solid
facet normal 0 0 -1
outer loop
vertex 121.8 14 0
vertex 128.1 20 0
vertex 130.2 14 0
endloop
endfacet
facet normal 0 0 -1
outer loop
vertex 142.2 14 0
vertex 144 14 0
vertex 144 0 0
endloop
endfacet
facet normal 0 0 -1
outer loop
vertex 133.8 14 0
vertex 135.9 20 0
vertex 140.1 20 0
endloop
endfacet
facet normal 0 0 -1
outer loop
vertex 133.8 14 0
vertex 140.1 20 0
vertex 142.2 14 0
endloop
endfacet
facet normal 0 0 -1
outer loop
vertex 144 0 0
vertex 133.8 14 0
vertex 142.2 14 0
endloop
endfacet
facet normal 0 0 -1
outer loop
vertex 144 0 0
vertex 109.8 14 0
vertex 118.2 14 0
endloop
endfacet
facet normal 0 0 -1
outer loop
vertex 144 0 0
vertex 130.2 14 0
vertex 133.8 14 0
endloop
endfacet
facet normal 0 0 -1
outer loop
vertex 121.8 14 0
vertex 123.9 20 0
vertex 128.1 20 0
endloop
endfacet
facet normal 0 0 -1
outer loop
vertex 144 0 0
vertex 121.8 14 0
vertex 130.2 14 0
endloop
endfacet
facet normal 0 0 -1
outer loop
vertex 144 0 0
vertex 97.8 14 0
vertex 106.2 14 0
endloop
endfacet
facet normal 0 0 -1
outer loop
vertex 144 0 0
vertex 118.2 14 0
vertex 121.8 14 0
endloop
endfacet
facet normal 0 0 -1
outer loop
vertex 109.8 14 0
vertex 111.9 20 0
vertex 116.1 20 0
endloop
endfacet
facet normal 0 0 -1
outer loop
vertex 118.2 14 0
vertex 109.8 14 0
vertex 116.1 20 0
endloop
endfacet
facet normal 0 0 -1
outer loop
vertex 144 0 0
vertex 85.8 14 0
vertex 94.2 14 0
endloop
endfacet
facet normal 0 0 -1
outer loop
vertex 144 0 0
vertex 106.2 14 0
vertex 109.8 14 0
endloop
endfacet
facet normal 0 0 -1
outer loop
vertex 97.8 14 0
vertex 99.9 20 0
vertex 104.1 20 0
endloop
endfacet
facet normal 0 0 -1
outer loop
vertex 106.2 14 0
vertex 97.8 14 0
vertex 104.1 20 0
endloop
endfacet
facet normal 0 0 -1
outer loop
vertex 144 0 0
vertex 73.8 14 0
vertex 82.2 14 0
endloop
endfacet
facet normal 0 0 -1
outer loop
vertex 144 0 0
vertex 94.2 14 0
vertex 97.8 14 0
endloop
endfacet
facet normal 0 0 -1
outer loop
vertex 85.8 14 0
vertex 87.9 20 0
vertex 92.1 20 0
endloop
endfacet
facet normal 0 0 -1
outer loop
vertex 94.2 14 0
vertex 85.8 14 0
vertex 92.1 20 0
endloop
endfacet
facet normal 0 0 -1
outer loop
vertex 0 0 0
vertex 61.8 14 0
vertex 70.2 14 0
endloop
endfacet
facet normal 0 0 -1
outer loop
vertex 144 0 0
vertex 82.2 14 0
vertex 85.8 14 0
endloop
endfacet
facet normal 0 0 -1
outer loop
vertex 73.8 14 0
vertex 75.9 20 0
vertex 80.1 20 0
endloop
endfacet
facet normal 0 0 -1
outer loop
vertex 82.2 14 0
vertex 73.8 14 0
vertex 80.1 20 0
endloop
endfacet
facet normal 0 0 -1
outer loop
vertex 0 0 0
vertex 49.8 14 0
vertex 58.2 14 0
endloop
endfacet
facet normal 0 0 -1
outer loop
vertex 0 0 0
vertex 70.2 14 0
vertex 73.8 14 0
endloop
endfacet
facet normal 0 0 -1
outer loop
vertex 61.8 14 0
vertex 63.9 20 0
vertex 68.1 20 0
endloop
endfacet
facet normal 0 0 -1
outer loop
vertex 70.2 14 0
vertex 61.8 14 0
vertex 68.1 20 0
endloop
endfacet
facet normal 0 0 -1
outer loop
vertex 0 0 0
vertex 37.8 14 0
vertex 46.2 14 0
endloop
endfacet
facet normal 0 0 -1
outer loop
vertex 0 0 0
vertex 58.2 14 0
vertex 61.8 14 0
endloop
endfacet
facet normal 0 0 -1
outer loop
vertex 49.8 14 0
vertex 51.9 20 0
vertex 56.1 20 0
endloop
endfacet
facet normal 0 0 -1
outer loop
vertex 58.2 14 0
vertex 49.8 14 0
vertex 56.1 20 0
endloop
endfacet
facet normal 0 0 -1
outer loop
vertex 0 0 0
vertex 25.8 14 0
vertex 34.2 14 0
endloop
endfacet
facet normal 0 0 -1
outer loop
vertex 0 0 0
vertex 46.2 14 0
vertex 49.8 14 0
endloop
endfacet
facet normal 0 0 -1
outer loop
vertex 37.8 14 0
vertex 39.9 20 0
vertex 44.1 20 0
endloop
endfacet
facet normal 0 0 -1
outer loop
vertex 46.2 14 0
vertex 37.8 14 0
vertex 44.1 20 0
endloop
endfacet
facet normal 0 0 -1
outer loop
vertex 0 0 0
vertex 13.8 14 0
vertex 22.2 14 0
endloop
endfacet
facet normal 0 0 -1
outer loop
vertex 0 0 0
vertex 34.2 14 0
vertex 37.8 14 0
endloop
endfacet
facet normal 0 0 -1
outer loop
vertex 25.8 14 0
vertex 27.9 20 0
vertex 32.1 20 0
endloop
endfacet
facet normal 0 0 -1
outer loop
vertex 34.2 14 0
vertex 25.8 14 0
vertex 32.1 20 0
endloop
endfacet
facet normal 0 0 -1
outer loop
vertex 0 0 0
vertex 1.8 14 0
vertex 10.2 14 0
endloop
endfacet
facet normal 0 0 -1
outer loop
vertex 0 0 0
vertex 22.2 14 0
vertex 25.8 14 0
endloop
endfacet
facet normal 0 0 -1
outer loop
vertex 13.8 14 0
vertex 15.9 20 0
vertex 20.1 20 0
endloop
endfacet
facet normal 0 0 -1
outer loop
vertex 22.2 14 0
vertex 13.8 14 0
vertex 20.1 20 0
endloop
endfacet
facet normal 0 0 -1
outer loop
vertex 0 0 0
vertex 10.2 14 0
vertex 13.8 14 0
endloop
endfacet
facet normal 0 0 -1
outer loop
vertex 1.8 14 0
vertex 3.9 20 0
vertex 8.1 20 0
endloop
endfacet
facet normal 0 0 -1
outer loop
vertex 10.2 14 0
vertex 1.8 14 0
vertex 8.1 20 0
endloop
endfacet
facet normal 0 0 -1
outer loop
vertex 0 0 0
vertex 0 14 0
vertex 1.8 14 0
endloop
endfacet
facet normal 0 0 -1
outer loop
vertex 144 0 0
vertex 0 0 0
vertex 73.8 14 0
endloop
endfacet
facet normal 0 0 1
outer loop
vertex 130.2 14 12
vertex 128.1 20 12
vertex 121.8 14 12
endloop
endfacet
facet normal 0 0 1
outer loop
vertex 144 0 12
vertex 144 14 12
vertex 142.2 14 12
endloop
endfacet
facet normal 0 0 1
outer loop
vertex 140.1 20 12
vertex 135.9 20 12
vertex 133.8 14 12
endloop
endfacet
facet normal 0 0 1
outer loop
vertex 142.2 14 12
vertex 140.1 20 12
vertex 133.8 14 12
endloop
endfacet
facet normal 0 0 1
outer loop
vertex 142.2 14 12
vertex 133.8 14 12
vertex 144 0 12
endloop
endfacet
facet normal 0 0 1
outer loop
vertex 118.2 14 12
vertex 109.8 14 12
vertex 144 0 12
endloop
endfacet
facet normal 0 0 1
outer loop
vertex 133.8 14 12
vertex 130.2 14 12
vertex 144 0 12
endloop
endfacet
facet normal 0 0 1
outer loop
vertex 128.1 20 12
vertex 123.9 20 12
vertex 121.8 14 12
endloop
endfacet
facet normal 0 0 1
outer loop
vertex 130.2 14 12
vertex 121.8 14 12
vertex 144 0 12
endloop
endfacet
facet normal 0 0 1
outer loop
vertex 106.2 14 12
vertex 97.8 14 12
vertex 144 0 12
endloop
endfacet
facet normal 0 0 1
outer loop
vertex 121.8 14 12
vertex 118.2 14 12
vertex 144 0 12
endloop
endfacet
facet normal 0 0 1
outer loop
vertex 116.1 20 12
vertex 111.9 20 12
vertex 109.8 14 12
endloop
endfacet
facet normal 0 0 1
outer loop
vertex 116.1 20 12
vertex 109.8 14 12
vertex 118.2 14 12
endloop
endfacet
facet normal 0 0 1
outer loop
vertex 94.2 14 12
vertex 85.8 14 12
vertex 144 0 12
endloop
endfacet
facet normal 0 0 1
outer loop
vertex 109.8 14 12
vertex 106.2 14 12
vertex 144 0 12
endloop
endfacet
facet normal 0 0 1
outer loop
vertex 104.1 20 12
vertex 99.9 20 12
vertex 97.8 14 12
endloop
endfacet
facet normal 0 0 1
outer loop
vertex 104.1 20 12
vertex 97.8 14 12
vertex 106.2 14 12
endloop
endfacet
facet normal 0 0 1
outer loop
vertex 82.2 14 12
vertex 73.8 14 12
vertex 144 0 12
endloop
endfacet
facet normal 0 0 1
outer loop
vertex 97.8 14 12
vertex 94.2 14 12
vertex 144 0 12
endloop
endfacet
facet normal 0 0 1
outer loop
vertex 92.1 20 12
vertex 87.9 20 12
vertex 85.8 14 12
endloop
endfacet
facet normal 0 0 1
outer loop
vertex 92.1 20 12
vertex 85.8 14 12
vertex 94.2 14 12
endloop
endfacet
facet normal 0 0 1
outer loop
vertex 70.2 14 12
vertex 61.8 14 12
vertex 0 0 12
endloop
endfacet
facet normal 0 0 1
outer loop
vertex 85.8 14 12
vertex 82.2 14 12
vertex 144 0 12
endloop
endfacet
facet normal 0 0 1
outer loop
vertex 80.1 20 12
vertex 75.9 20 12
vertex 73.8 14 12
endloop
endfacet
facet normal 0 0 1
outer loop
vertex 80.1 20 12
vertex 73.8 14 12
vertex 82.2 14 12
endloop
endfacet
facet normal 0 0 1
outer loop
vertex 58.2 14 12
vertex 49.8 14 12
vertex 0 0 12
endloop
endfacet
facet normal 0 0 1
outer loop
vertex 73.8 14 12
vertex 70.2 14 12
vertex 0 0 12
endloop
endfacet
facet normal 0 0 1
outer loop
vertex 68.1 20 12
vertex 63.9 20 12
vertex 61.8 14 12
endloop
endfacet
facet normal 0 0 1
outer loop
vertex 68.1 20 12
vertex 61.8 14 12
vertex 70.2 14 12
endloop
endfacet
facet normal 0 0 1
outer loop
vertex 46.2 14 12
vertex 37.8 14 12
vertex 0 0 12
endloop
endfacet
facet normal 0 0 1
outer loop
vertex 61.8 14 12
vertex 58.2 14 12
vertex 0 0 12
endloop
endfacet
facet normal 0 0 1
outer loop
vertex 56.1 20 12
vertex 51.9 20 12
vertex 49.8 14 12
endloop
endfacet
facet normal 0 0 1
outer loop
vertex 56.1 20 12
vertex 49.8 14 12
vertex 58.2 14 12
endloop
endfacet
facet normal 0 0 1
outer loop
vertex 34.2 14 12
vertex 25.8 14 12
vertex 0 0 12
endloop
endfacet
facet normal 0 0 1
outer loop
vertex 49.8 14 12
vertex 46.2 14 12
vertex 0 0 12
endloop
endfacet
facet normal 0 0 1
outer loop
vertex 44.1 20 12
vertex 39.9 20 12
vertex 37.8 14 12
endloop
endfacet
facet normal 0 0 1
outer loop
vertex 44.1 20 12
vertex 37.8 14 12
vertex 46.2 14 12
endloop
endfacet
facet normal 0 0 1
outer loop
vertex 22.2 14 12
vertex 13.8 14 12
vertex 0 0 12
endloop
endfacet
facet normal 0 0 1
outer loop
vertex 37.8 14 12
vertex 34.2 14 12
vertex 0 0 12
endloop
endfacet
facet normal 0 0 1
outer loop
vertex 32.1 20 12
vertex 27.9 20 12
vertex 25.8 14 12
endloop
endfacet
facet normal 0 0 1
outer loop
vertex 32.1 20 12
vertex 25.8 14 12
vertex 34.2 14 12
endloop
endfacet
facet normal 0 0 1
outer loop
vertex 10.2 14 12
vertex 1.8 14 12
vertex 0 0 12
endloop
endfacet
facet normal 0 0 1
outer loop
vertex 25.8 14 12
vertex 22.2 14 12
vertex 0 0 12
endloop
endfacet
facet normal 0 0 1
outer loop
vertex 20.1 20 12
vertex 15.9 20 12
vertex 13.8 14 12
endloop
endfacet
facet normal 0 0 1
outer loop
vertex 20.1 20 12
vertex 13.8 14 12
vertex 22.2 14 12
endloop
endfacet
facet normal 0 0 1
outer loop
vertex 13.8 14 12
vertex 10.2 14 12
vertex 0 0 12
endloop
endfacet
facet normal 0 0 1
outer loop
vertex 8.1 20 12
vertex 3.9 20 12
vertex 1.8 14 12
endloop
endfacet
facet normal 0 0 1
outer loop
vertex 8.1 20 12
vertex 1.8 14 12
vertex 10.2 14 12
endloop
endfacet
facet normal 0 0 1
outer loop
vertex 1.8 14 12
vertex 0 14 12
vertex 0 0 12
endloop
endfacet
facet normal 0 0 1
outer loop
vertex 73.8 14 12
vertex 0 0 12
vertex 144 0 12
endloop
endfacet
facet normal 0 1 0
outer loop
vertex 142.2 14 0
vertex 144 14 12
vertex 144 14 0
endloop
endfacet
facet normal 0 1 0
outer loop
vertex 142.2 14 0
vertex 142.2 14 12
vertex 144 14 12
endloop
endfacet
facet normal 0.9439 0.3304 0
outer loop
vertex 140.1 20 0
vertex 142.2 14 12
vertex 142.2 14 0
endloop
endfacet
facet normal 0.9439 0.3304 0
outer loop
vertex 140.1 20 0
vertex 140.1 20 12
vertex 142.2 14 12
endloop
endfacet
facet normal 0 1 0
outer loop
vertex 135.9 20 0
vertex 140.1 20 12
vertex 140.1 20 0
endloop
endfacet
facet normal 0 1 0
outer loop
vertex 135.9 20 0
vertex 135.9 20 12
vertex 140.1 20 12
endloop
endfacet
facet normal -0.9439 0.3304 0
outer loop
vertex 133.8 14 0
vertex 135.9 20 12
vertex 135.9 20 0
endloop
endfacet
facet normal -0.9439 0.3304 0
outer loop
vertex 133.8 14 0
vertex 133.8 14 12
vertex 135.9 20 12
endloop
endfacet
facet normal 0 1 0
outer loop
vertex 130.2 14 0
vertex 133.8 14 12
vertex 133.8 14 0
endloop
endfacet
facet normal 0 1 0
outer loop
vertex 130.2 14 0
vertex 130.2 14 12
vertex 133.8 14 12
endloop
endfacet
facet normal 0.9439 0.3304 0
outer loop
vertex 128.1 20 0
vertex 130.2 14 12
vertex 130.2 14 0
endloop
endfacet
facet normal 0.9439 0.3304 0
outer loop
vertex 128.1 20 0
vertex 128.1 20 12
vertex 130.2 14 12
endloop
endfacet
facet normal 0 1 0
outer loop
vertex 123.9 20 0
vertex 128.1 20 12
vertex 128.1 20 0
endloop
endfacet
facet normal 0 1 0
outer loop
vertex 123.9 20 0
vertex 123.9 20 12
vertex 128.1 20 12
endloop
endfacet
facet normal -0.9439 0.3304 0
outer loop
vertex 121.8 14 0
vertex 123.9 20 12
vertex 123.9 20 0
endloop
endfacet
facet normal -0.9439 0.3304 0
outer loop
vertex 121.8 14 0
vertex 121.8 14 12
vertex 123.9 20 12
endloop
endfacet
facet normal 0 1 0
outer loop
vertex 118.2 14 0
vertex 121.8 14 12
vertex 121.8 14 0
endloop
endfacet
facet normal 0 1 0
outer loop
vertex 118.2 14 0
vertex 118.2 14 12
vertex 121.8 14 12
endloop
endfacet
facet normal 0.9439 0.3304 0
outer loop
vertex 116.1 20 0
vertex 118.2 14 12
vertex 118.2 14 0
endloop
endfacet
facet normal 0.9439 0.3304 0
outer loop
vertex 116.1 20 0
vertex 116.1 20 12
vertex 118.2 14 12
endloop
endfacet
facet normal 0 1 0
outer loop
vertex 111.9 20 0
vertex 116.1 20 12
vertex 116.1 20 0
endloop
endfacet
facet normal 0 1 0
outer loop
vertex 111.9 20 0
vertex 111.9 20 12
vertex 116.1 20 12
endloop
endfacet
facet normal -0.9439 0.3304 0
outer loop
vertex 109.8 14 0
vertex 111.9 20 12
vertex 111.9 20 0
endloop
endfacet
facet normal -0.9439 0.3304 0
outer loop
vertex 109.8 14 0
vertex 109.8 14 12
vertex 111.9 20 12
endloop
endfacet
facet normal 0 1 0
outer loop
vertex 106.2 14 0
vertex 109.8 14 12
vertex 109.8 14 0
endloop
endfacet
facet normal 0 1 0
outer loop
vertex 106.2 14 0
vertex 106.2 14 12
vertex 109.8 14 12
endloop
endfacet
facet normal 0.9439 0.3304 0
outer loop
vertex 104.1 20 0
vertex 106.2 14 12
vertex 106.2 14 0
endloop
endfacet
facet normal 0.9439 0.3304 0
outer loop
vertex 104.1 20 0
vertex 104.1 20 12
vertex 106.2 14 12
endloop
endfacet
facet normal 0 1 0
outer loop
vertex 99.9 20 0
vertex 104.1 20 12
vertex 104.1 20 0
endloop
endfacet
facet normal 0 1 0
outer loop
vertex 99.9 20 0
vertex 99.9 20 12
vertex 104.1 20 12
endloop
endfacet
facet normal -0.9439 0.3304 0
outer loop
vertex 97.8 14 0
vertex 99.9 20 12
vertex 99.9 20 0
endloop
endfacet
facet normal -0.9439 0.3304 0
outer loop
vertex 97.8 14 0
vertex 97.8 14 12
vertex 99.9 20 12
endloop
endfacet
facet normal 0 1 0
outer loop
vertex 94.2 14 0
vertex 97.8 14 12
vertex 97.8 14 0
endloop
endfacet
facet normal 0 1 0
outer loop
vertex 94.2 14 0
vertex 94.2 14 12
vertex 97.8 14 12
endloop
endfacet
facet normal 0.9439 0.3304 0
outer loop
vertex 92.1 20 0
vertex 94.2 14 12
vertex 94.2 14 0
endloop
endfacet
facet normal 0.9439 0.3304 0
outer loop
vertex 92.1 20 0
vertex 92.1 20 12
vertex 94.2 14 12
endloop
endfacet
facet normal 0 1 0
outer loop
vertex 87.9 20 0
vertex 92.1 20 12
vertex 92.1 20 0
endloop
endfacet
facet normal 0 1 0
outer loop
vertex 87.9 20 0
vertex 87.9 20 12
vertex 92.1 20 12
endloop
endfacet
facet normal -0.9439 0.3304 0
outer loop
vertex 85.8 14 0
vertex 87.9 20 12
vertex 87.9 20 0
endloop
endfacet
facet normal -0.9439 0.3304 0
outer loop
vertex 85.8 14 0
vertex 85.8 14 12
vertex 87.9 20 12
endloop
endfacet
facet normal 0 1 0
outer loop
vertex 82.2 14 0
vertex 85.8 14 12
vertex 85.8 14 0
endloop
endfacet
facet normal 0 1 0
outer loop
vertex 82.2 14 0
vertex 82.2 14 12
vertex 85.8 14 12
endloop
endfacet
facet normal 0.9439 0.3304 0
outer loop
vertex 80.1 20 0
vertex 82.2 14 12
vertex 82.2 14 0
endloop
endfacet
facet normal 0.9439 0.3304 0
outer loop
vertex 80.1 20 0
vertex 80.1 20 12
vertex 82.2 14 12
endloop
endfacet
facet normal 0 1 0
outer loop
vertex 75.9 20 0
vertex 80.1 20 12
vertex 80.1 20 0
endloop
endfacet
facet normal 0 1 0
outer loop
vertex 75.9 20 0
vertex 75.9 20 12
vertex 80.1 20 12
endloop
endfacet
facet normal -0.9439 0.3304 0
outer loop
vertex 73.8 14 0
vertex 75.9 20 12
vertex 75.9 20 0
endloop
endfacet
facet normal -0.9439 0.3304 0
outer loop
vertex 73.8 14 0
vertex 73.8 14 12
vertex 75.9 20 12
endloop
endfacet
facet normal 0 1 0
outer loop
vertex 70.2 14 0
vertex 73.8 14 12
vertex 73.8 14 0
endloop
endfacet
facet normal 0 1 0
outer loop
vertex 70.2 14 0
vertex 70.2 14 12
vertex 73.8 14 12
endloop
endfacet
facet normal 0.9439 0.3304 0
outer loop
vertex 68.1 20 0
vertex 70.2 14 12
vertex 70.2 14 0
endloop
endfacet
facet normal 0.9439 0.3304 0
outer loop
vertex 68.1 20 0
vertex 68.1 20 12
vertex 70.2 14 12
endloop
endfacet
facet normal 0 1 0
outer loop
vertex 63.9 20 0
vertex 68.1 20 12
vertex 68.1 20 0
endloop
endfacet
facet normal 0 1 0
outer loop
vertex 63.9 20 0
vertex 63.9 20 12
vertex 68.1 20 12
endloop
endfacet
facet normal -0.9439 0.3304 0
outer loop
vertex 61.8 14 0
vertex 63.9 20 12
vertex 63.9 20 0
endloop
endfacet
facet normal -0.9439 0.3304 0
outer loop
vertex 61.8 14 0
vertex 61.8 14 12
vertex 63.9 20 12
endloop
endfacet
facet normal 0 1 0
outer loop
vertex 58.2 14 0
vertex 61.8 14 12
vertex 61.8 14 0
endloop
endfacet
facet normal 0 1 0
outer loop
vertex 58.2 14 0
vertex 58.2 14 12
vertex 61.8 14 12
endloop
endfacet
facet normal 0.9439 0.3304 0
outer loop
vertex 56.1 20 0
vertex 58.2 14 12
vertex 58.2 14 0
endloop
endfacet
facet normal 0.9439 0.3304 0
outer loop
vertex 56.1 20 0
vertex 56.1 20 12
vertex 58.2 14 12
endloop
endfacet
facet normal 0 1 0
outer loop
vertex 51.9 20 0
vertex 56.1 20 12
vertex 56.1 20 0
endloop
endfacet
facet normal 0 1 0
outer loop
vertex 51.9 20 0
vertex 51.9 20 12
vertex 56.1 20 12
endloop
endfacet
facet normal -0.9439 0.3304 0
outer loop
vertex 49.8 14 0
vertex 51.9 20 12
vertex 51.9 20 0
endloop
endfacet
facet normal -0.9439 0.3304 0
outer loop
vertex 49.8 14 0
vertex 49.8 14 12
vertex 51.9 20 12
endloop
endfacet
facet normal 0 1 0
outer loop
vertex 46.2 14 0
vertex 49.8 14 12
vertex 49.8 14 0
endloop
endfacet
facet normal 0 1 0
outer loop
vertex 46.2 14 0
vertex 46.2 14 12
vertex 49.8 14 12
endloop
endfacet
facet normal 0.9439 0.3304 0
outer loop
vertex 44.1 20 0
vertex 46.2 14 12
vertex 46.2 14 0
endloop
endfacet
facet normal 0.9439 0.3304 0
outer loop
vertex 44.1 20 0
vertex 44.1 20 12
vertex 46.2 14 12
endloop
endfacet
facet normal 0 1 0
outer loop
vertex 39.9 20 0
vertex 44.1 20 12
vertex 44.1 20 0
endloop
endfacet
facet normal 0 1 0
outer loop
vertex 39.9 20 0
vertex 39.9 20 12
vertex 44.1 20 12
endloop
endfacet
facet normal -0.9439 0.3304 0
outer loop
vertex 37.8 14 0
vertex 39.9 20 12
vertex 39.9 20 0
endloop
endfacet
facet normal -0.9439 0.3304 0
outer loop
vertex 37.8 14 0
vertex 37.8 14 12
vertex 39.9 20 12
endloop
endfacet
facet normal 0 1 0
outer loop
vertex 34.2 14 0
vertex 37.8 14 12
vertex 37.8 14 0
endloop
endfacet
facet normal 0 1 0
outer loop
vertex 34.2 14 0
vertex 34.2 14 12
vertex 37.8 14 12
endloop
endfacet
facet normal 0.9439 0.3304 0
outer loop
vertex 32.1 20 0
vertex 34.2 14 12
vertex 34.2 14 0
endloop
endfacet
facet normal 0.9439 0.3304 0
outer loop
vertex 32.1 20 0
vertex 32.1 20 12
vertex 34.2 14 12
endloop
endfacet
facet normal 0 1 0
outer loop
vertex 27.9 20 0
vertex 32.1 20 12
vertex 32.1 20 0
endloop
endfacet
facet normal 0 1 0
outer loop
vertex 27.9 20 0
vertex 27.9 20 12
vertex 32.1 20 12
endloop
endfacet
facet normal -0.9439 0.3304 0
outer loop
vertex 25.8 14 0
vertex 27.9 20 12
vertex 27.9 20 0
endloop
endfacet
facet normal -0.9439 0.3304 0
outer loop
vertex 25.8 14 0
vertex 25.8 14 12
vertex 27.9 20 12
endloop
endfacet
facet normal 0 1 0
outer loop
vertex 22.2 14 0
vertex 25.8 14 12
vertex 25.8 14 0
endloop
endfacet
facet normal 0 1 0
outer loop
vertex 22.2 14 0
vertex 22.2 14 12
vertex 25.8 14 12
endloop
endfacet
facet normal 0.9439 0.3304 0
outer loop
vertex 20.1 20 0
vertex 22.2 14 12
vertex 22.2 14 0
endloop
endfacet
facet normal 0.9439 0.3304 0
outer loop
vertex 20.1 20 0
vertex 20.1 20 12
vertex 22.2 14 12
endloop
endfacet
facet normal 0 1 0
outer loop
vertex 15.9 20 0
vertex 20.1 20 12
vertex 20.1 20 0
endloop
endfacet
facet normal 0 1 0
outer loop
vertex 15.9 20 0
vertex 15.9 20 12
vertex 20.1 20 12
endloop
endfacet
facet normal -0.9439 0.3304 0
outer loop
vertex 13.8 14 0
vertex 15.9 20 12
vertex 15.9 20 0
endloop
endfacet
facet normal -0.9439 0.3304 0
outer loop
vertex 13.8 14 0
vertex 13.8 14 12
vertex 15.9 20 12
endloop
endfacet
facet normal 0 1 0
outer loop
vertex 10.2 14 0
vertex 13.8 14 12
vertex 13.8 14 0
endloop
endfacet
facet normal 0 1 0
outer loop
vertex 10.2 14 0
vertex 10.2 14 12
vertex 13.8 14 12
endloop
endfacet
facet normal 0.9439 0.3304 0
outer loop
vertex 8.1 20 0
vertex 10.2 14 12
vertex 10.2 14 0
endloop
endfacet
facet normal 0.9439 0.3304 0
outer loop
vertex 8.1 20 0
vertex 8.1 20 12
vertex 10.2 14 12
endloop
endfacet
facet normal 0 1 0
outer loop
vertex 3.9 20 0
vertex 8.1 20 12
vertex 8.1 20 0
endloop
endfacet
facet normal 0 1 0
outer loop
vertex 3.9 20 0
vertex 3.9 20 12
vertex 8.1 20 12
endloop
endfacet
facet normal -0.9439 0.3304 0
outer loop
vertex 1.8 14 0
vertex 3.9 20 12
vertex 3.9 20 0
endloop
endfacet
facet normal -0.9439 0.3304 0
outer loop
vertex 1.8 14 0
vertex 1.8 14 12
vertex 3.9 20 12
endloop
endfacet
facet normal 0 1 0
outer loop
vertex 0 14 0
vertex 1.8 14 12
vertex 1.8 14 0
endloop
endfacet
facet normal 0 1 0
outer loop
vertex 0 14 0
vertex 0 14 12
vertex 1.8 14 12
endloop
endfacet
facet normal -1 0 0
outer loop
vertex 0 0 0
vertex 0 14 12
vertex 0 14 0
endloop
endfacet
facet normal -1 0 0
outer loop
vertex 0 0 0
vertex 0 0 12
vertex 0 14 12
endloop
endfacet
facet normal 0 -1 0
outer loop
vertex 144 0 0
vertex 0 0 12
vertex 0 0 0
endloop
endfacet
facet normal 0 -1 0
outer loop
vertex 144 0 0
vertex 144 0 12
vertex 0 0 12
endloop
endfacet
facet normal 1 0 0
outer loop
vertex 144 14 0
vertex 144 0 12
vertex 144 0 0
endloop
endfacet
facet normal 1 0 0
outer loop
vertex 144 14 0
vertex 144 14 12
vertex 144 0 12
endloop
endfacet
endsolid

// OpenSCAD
$fn = 32;

// ----------------------------------------------------------------------
// Gear rack: 12 teeth, pitch 12 mm
// ----------------------------------------------------------------------

// --- parameters (mm) ---
teeth = 12;               // number of teeth
pitch = 12;               // tooth pitch, X
root_w = 8.4;             // tooth width at the root
tip_w = 4.2;              // tooth width at the tip
base_h = 14;              // rack body height, Y
tooth_h = 6;              // tooth height above the body
plate_t = 12;             // rack width, Z (extrusion height)
fit_tol = 0.1;            // declared fit tolerance (prompt contract)
free_tol = 0.3;           // declared free tolerance (prompt contract)

rack_l = teeth * pitch;  // overall length
total_h = base_h + tooth_h;  // overall height

profile = [[0, 0], [144, 0], [144, 14], [142.2, 14], [140.1, 20], [135.9, 20], [133.8, 14], [130.2, 14], [128.1, 20], [123.9, 20], [121.8, 14], [118.2, 14], [116.1, 20], [111.9, 20], [109.8, 14], [106.2, 14], [104.1, 20], [99.9, 20], [97.8, 14], [94.2, 14], [92.1, 20], [87.9, 20], [85.8, 14], [82.2, 14], [80.1, 20], [75.9, 20], [73.8, 14], [70.2, 14], [68.1, 20], [63.9, 20], [61.8, 14], [58.2, 14], [56.1, 20], [51.9, 20], [49.8, 14], [46.2, 14], [44.1, 20], [39.9, 20], [37.8, 14], [34.2, 14], [32.1, 20], [27.9, 20], [25.8, 14], [22.2, 14], [20.1, 20], [15.9, 20], [13.8, 14], [10.2, 14], [8.1, 20], [3.9, 20], [1.8, 14], [0, 14]];  // primary outline, 52 points, counter clockwise

// --- the one profile operation ---
linear_extrude(height = plate_t) polygon(points = profile);
